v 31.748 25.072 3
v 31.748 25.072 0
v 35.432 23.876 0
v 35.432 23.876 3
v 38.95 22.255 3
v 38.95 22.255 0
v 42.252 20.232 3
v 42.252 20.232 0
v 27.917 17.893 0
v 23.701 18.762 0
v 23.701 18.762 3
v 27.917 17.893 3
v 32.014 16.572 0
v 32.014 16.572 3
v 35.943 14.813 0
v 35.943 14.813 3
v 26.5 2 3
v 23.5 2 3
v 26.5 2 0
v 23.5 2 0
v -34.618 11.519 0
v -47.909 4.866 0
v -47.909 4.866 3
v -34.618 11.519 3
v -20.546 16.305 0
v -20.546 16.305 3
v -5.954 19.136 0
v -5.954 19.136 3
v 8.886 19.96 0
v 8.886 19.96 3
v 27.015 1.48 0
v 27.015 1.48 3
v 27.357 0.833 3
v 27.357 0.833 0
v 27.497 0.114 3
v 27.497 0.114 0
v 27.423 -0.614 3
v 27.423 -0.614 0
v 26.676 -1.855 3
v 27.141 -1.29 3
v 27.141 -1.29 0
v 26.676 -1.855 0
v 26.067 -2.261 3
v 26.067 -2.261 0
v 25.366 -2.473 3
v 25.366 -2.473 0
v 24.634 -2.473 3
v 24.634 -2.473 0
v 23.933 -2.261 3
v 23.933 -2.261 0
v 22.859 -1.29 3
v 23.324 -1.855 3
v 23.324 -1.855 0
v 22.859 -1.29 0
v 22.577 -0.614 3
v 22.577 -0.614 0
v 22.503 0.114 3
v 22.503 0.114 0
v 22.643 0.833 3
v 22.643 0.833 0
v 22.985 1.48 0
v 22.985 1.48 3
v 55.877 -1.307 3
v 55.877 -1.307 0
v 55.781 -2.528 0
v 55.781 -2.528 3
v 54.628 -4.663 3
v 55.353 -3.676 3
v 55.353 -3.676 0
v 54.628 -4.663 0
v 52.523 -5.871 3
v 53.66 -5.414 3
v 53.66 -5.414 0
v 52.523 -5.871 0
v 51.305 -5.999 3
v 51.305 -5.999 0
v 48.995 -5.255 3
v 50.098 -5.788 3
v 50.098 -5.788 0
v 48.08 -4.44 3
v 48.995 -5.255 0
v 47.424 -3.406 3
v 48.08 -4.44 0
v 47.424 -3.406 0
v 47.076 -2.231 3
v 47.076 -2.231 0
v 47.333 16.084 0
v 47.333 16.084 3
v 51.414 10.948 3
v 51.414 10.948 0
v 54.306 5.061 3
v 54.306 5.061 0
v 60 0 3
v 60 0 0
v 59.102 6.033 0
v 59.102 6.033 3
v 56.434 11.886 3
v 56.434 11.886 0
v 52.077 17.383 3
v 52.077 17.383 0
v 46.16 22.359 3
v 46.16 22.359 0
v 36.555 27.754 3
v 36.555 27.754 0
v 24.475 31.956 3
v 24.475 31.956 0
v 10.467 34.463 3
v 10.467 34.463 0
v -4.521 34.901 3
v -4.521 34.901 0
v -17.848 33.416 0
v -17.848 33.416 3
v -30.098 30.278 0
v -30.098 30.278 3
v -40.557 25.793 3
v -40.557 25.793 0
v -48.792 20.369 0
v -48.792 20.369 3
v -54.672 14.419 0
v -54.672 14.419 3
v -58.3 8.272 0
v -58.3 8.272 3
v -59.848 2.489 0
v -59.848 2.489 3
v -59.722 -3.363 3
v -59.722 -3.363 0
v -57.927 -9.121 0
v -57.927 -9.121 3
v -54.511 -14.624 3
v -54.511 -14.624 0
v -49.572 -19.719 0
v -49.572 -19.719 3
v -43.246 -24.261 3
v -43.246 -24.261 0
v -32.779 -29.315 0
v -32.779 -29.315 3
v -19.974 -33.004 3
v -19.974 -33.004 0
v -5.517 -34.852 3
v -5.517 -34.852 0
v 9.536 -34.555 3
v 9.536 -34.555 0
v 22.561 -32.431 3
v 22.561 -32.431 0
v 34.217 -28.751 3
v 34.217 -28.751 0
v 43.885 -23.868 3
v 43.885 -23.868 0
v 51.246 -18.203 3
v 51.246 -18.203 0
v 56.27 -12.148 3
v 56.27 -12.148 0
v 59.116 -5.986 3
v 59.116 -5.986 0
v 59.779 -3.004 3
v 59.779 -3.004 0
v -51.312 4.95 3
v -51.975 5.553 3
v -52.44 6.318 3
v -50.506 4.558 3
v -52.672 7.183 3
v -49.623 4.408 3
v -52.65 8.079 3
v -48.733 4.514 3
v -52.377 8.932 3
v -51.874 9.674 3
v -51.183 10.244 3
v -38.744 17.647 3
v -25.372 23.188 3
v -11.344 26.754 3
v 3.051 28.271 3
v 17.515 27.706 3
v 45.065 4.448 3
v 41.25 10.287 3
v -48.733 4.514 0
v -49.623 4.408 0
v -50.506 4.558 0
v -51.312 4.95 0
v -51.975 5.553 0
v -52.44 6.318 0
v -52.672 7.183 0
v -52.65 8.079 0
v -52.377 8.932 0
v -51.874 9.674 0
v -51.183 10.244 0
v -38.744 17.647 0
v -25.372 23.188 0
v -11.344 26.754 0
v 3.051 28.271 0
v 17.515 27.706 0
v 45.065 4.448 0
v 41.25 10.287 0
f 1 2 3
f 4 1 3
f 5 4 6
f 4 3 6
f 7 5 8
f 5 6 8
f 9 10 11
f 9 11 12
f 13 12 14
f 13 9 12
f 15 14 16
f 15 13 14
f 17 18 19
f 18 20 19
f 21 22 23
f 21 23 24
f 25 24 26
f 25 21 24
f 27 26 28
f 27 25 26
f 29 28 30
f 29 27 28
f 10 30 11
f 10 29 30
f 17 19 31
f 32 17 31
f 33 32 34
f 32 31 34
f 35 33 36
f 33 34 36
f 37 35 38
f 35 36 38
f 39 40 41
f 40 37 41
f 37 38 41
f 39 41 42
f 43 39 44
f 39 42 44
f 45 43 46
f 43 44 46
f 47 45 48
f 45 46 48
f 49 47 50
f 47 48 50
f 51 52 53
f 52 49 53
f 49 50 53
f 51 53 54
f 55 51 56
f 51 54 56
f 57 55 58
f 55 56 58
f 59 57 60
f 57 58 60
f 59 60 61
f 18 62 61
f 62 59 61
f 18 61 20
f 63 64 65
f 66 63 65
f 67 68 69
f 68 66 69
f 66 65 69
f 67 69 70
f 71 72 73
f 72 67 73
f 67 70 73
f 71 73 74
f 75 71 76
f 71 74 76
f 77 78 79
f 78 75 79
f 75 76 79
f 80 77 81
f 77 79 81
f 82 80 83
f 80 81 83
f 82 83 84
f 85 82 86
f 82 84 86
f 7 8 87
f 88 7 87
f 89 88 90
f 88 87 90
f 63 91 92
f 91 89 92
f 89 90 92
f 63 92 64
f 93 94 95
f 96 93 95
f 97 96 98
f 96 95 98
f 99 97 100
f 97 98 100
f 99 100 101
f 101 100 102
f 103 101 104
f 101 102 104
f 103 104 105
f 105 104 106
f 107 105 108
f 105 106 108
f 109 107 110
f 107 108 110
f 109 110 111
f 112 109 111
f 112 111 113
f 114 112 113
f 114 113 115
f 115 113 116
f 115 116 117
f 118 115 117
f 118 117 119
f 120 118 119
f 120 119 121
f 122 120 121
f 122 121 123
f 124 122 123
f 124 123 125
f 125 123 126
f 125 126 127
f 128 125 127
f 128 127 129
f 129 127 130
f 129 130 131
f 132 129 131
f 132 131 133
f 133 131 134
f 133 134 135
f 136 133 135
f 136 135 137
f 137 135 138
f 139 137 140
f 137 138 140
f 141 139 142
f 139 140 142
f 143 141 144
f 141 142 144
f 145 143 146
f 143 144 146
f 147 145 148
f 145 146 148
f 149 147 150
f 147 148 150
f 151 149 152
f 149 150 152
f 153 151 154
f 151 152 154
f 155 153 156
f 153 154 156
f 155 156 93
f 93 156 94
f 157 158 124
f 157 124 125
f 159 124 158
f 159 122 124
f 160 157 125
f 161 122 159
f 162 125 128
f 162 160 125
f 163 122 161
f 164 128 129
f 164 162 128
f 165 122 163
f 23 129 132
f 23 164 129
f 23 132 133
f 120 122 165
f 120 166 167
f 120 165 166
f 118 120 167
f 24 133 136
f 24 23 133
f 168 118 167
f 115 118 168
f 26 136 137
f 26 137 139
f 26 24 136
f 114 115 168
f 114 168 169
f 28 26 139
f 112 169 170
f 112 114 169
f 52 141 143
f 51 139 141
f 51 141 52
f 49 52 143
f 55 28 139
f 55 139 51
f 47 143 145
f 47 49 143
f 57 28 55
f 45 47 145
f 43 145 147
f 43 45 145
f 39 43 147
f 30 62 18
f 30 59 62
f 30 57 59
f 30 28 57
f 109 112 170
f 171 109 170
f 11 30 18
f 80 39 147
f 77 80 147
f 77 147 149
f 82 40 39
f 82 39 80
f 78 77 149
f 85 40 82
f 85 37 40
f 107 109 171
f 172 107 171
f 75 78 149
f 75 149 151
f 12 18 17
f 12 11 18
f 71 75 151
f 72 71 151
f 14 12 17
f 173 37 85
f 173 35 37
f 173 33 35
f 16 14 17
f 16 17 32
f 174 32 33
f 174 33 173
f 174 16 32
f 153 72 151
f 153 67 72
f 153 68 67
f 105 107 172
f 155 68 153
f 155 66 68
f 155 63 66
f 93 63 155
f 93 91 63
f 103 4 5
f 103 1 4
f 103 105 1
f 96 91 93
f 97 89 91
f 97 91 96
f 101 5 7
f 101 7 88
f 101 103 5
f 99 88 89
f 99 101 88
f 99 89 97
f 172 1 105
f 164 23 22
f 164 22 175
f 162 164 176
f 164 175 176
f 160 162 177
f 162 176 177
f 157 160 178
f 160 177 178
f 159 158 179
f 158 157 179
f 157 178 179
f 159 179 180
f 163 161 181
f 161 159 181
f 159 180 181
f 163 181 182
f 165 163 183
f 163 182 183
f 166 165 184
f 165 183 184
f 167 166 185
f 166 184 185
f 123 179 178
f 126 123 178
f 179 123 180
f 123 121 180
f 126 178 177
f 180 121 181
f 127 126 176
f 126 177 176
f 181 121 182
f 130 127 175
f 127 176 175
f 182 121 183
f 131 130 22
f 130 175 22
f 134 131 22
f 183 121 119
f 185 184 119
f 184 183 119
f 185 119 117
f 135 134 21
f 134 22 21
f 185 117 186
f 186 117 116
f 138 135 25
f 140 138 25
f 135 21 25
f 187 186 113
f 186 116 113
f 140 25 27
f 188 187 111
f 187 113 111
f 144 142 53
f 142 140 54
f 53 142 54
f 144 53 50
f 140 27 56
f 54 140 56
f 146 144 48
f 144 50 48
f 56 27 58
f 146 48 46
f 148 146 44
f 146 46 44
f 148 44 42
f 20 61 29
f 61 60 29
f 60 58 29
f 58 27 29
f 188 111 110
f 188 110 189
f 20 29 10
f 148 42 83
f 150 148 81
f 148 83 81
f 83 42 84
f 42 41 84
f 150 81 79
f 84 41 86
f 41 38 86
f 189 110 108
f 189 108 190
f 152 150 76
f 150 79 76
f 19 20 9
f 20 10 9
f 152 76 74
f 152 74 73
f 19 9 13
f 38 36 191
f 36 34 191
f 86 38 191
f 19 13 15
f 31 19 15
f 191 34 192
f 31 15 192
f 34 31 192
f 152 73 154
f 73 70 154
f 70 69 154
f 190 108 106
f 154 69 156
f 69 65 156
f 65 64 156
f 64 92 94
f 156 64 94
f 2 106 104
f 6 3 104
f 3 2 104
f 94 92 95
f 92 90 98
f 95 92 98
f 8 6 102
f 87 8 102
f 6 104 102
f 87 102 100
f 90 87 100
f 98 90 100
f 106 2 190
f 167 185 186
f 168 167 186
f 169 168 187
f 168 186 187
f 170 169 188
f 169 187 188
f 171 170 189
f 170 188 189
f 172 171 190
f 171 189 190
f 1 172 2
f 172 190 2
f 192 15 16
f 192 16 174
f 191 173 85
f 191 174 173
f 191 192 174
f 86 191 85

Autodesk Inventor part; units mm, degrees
ref_plane "YZ Plane" through (0, 0, 0) normal (1, 0, 0) x (0, 1, 0)
ref_plane "XZ Plane" through (0, 0, 0) normal (0, 1, 0) x (-1, 0, 0)
ref_plane "XY Plane" through (0, 0, 0) normal (0, 0, 1) x (1, 0, 0)
sketch "Sketch1" plane through (0, 0, 0) normal (0, 0, 1) x (1, 0, 0)
  ellipse E0 centre (0, 0) end of major axis (60, 0) minor radius 35
  arc A0 (31.7478, 25.0725) -> (-51.1828, 10.244) centre (6.3686, -72.3059) ccw
  arc A1 (23.7013, 18.7616) -> (-47.9094, 4.8665) centre (7.508, -89.26) ccw
  arc A2 (55.8771, -1.3072) -> (42.2522, 20.2317) centre (25.552, -5.4112) ccw
  arc A3 (47.0757, -2.2311) -> (35.9428, 14.8131) centre (22.8888, -5.8715) ccw
  arc A4 (35.9428, 14.8131) -> (23.7013, 18.7616) centre (17.8337, -20.3799) ccw
  arc A5 (42.2522, 20.2317) -> (31.7478, 25.0725) centre (23.4586, -6.7326) ccw
  arc A6 (-51.1828, 10.244) -> (-47.9094, 4.8665) centre (-49.5461, 7.5553) ccw
  arc A7 (47.0757, -2.2311) -> (55.8771, -1.3072) centre (51.4557, -1.5719) ccw
  arc A8 (23.5, 2) -> (26.5, 2) centre (25, 0) ccw
  line L0 (23.5, 2) -> (26.5, 2)
  dimension "d0" = 60
  dimension "d1" = 35
  dimension "d2" = 5
  dimension "d3" = 2
  dimension "d4" = 25
extrude "Extrusion1" add sketch "Sketch1" along normal blind 3
properties part number "Rail1st_withD"
